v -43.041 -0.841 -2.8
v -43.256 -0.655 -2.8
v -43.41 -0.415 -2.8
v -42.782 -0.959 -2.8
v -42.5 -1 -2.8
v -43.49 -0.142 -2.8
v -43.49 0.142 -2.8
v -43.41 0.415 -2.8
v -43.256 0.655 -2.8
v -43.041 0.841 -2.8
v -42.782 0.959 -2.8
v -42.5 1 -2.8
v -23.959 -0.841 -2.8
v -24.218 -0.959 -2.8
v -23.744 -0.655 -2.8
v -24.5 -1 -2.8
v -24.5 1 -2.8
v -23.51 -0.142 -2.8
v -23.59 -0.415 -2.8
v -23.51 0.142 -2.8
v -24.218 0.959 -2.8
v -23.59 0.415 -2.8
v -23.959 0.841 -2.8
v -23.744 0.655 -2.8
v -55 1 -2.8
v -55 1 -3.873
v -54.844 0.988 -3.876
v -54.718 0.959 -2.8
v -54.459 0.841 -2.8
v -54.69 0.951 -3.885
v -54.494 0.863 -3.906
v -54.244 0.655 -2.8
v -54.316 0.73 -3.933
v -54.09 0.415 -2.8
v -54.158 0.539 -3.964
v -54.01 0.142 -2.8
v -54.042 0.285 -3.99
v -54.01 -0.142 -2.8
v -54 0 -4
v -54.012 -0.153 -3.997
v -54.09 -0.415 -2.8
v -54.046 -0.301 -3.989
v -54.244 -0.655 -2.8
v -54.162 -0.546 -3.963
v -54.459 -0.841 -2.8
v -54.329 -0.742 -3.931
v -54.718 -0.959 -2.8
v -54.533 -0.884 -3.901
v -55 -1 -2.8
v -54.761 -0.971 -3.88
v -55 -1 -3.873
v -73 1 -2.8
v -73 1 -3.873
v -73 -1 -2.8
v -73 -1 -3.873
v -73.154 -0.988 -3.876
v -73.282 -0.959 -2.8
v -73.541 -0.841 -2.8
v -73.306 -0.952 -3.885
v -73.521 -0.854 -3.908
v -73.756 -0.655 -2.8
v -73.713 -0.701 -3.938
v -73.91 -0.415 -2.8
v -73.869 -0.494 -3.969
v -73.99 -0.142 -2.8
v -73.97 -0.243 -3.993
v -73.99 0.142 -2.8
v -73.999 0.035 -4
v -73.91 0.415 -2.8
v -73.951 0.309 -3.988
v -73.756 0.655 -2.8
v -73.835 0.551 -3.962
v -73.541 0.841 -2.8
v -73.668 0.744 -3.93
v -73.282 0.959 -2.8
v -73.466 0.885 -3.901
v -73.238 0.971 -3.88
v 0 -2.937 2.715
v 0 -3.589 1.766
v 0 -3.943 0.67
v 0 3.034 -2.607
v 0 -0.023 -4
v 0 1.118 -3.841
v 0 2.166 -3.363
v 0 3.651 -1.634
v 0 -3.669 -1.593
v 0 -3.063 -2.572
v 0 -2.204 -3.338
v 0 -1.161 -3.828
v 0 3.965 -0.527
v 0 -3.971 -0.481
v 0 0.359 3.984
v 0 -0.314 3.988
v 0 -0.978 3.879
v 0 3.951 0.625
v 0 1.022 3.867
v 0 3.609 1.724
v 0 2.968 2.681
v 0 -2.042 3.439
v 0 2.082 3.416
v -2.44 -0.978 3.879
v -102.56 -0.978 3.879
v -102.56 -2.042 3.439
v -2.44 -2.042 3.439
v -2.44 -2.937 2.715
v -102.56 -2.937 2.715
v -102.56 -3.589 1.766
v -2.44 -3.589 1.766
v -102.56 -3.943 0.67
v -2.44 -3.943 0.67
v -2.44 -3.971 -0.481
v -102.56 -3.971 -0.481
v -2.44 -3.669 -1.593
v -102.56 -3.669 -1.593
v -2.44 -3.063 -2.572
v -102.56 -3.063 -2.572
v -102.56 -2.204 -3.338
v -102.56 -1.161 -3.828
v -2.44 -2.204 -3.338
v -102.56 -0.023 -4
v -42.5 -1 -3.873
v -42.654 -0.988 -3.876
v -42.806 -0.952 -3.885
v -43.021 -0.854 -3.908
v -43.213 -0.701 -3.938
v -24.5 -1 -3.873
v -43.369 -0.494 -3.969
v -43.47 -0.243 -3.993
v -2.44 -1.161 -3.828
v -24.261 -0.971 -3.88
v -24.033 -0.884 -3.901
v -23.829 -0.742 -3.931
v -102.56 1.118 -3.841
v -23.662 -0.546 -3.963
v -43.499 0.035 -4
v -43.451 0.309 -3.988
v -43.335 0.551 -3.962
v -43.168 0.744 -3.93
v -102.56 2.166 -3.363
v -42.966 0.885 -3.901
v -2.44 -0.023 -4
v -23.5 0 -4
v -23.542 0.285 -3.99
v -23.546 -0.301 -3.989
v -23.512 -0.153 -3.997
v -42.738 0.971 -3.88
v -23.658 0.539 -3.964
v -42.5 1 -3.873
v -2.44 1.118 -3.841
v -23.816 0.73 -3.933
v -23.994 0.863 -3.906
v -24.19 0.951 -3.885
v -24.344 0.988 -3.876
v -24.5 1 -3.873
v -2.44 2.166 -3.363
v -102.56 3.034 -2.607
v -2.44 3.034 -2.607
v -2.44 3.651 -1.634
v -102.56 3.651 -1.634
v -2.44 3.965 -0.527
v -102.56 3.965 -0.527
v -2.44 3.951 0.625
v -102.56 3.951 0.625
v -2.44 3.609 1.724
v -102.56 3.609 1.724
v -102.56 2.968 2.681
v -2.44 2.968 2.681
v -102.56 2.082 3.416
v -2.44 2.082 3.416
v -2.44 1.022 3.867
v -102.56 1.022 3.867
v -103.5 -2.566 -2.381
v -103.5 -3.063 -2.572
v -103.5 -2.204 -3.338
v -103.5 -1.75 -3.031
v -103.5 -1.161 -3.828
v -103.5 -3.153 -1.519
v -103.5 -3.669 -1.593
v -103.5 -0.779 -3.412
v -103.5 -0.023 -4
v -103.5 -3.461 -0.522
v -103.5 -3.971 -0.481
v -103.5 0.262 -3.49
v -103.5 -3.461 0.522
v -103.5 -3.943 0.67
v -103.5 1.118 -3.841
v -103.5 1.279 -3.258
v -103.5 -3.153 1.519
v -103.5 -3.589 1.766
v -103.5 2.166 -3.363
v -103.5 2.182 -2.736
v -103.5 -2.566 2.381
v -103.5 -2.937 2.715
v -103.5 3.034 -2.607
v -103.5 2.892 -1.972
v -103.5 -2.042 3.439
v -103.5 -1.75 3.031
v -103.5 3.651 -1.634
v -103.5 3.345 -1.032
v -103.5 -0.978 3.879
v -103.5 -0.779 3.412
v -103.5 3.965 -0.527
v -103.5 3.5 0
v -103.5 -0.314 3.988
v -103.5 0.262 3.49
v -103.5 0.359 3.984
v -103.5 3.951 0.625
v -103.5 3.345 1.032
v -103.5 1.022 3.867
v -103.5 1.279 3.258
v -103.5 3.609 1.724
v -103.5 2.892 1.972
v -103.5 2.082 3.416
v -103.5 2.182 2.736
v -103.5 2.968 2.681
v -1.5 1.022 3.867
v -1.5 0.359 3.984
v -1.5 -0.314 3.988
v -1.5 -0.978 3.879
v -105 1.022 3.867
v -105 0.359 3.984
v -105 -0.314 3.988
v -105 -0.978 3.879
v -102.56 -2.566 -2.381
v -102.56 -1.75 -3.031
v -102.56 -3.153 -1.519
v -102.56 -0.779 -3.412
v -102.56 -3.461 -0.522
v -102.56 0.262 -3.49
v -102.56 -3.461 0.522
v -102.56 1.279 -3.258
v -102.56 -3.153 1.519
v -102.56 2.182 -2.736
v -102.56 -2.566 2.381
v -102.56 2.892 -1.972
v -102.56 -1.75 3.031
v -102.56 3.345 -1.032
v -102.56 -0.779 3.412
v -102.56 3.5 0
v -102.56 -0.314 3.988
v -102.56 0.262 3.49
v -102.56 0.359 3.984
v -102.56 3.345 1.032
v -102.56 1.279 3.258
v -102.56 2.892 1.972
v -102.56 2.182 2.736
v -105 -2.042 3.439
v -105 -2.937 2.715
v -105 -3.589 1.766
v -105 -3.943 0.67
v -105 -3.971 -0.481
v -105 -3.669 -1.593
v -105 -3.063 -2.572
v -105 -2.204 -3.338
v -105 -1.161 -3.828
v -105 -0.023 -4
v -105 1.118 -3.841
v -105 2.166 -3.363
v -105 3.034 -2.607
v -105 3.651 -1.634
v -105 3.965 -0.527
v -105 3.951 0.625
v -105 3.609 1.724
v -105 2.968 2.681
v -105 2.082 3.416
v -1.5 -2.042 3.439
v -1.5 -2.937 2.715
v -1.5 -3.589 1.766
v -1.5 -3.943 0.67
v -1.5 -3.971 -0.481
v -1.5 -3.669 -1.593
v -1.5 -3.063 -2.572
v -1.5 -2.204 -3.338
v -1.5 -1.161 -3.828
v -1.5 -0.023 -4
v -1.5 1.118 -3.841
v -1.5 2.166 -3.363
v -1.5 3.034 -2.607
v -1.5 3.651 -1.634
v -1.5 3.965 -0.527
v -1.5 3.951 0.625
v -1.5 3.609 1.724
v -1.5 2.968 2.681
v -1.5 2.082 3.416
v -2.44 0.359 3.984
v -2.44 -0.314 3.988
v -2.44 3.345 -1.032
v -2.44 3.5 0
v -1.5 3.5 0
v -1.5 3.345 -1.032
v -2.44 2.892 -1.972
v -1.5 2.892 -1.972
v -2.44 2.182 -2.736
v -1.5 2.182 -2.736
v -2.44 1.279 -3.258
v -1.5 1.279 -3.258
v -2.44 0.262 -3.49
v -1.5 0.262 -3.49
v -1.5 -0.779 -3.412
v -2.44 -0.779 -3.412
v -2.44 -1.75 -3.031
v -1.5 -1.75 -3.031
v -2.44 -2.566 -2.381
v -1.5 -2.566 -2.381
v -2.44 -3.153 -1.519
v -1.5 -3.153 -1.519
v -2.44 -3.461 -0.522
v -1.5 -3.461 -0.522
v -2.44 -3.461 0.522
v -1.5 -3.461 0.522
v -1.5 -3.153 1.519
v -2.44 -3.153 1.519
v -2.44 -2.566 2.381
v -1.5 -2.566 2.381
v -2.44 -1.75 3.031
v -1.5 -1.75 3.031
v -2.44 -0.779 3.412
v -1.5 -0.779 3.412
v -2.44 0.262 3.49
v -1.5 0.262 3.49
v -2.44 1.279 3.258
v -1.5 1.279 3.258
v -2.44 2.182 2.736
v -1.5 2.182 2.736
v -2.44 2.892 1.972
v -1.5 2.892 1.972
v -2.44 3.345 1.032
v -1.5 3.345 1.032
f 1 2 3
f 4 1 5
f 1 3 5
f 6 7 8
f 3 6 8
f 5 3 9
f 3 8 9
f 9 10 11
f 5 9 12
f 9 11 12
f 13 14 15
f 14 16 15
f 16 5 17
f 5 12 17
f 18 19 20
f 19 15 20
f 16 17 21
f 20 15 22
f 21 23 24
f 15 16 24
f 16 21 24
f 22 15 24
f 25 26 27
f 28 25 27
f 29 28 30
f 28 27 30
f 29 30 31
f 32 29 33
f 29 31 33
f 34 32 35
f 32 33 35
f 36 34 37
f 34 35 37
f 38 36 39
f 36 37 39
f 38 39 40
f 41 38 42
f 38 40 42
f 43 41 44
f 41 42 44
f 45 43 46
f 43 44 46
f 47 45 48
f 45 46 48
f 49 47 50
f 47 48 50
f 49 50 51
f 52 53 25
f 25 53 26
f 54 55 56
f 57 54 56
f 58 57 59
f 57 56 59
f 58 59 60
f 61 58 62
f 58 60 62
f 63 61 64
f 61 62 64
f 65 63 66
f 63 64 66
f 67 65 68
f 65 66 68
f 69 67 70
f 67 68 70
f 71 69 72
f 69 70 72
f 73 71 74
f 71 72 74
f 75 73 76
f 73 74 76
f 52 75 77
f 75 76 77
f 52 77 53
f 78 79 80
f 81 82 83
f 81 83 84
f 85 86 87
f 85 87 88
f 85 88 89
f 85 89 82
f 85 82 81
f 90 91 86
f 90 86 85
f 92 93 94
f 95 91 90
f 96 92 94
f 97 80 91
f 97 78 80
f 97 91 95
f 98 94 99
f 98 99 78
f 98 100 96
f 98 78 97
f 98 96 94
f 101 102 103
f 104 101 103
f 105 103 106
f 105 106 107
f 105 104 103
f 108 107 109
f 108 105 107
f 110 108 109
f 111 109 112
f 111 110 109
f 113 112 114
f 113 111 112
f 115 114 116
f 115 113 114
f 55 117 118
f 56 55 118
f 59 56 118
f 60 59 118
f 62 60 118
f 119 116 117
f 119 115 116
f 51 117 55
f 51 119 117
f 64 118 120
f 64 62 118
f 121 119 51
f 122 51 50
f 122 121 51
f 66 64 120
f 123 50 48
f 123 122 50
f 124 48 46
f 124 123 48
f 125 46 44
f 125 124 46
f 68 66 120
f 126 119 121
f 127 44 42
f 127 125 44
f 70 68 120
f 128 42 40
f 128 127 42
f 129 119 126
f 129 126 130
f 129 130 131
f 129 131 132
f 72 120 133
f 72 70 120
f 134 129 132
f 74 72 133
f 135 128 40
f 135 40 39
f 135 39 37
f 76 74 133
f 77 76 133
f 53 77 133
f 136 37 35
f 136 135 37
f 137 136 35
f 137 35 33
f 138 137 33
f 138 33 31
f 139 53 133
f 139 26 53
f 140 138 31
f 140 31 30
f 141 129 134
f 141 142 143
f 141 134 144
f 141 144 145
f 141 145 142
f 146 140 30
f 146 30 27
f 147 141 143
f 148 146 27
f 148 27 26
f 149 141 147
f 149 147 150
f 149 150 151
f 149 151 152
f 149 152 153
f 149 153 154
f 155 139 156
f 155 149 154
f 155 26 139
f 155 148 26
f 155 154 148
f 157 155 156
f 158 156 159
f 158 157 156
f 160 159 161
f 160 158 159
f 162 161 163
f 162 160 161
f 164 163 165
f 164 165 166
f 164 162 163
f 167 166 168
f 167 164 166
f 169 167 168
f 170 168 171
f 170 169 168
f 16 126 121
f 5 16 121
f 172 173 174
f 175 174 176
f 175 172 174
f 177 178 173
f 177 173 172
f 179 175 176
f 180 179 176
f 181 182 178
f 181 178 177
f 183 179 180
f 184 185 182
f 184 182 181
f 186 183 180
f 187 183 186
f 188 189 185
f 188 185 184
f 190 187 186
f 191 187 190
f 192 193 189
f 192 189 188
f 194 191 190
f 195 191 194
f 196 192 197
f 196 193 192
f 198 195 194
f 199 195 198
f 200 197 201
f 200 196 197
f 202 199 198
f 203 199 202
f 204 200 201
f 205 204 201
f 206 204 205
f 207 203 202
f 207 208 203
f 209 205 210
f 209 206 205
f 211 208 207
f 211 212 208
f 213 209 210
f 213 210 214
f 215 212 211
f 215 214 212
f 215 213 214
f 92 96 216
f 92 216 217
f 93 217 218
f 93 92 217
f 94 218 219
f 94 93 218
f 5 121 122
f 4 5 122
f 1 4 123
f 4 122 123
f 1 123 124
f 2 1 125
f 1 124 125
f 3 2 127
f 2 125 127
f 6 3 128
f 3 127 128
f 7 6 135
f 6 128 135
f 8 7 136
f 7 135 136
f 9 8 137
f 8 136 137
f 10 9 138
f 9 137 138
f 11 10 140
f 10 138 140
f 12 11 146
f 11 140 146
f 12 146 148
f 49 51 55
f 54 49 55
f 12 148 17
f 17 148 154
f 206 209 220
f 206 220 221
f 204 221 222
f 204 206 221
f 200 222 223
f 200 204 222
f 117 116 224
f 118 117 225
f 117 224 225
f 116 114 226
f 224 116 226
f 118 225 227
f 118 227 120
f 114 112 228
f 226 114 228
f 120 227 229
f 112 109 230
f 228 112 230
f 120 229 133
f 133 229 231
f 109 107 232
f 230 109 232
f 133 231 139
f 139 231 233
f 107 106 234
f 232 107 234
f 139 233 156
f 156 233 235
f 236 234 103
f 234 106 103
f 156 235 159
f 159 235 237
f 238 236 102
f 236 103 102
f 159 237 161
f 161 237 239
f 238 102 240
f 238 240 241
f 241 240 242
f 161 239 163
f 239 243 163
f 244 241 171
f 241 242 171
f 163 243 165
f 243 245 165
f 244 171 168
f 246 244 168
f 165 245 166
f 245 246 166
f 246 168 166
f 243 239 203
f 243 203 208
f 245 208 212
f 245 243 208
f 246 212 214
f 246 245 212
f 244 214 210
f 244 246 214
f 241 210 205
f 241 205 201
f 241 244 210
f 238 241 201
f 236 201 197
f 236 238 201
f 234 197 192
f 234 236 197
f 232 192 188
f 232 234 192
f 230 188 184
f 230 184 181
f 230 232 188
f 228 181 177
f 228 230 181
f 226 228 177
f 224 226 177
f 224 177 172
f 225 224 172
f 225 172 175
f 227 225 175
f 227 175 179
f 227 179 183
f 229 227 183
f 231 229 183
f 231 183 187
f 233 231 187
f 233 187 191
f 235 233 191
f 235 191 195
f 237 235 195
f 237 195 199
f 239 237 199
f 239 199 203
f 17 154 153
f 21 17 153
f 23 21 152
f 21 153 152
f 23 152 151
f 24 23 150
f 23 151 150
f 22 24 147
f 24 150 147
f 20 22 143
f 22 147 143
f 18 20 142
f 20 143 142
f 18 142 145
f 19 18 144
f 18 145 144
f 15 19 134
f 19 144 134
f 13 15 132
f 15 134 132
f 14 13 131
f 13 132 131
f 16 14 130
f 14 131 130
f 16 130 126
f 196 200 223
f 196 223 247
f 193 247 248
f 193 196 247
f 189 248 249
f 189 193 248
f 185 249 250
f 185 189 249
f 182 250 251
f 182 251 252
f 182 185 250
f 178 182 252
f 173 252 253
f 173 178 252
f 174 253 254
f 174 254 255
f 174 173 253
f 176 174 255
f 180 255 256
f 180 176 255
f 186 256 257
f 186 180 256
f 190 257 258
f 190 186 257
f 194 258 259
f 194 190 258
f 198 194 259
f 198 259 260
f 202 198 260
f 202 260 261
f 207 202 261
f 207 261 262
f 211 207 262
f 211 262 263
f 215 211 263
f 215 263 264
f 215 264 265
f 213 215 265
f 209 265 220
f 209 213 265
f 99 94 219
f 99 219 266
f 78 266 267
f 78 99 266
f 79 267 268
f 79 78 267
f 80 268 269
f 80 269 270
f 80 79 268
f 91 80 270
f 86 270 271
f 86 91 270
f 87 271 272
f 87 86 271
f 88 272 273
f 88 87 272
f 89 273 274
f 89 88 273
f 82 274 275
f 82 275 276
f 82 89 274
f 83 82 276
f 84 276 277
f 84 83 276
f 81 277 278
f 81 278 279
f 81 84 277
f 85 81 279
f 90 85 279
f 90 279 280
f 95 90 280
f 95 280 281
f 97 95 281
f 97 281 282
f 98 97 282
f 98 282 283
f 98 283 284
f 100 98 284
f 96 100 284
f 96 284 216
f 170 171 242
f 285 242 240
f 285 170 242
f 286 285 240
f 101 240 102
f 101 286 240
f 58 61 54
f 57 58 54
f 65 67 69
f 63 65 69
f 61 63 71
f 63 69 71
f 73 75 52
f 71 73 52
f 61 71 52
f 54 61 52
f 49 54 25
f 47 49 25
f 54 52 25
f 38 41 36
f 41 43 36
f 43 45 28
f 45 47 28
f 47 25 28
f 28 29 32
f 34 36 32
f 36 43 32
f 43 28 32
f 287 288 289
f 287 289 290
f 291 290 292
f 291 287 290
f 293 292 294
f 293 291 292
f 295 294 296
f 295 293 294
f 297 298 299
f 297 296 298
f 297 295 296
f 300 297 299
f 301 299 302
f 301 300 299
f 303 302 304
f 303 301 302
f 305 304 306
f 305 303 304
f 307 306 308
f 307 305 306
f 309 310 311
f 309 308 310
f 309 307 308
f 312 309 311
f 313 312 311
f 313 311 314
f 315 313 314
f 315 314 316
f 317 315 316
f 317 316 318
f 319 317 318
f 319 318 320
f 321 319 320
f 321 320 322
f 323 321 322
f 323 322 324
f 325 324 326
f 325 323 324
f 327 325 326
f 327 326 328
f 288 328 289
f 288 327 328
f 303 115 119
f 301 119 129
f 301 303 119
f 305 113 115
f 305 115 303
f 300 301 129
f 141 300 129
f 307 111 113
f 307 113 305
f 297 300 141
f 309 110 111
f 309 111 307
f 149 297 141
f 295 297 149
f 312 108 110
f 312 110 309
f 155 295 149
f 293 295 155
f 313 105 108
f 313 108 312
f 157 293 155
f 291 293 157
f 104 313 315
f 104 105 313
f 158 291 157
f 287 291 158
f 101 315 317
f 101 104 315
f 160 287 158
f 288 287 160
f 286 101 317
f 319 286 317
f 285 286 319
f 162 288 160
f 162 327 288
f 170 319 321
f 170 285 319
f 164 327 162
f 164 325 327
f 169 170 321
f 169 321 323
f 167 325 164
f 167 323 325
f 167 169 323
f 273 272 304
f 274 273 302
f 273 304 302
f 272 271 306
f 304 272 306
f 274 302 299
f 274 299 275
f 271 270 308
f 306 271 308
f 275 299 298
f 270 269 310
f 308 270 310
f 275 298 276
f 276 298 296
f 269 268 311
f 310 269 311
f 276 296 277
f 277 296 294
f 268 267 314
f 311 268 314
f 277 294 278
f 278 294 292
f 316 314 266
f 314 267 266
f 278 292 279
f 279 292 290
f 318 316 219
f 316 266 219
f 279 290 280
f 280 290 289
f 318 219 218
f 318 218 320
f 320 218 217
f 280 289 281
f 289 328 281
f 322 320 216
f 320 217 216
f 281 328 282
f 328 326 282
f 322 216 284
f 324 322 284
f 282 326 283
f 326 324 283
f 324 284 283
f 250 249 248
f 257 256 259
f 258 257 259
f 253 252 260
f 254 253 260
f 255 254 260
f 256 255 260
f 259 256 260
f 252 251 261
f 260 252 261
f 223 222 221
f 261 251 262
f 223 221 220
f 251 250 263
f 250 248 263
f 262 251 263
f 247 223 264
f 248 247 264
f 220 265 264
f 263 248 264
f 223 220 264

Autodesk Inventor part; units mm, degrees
ref_plane "YZ Plane" through (0, 0, 0) normal (1, 0, 0) x (0, 1, 0)
ref_plane "XZ Plane" through (0, 0, 0) normal (0, 1, 0) x (-1, 0, 0)
sketch "Sketch1" plane through (0, 0, 0) normal (1, 0, 0) x (0, 1, 0)
  arc A0 (-0.9778, 3.8786) -> (1.0222, 3.8672) centre (0, 0) ccw
  circle A1 centre (0, 0) radius 4
  dimension "d0" = 8
extrude "Extrusion1" add sketch "Sketch1" against normal blind 105
sketch "Sketch2" plane through (0, 0, 0) normal (0, 0, 1) x (1, 0, 0)
  line L0 (-2.44, 6.5) -> (-1.5, 6.5)
  line L1 (-1.5, 6.5) -> (-1.5, 3.5)
  line L2 (-1.5, 3.5) -> (-2.44, 3.5)
  line L3 (-2.44, 3.5) -> (-2.44, 6.5)
  line L4 (0, 4) -> (0, -4) projected
  line L5 (0, 4) -> (-105, 4) projected
  line L6 (-126, 0) -> (21, 0) projected
  line L7 (0, 4) -> (-105, 4) projected
  line L8 (-52.5, 4) -> (-52.5, -9.5088)
  line L9 (-102.56, 6.5) -> (-103.5, 6.5)
  line L10 (-103.5, 6.5) -> (-103.5, 3.5)
  line L11 (-103.5, 3.5) -> (-102.56, 3.5)
  line L12 (-102.56, 3.5) -> (-102.56, 6.5)
  line L13 (-105, 4) -> (-105, -4)
  line L14 (0, -4) -> (-105, -4) projected
  point P0 (0, 0)
  point P1 (0, 1.0222)
  point P2 (0, -0.9778)
  point P3 (-105, 0)
  point P4 (-105, 1.0222)
  point P5 (-105, -0.9778)
  dimension "d9" = 1.5
  dimension "d10" = 0.94
  dimension "d11" = 0.5
  dimension "d12" = 3
  dimension "d18" = 8
revolve "Revolution1" cut sketch "Sketch2" angle 360 about axis through (-10, 0, 0) along (1, 0, 0) contours L0 L1 L5 L3 | L5 L1 L2 L3 | L12 L11 L10 L5 | L5 L10 L9 L12
ref_plane "Work Plane1" through (0, 0, -4) normal (0, 0, 1) x (1, 0, 0)
sketch "Sketch5" plane through (0, 0, -4) normal (0, 0, 1) x (1, 0, 0)
  line L0 (-73, 1) -> (-55, 1)
  line L1 (-55, 1) -> (-55, -1)
  line L2 (-55, -1) -> (-73, -1)
  line L3 (-73, -1) -> (-73, 1)
  line L4 (-2.44, -4) -> (-102.56, -4) projected
  line L5 (-2.44, 4) -> (-102.56, 4) projected
  line L6 (-105, 4) -> (-105, -4) projected
  circle A0 centre (-55, 0) radius 1
  circle A1 centre (-73, 0) radius 1
  line L7 (-42.5, 1) -> (-24.5, 1)
  line L8 (-24.5, 1) -> (-24.5, -1)
  line L9 (-24.5, -1) -> (-42.5, -1)
  line L10 (-42.5, -1) -> (-42.5, 1)
  circle A2 centre (-24.5, 0) radius 1
  circle A3 centre (-42.5, 0) radius 1
  line L11 (0, 4) -> (0, -4) projected
  point P0 (0, 0)
  dimension "d24" = 20
  dimension "d19" = 2
  dimension "d20" = 8
  dimension "d21" = 3
  dimension "d22" = 32
  dimension "d23" = 18
  dimension "d25" = 2
  dimension "d26" = 24.5
  dimension "d27" = 18
extrude "Extrusion4" cut sketch "Sketch5" along normal blind 1.2
equation "\"d21\" = 0.5 * d20 - 0.5 * d19"
equation "\"d27\" = d23"
properties part number "AxeHorizontalRoller" material "Stainless Steel"
